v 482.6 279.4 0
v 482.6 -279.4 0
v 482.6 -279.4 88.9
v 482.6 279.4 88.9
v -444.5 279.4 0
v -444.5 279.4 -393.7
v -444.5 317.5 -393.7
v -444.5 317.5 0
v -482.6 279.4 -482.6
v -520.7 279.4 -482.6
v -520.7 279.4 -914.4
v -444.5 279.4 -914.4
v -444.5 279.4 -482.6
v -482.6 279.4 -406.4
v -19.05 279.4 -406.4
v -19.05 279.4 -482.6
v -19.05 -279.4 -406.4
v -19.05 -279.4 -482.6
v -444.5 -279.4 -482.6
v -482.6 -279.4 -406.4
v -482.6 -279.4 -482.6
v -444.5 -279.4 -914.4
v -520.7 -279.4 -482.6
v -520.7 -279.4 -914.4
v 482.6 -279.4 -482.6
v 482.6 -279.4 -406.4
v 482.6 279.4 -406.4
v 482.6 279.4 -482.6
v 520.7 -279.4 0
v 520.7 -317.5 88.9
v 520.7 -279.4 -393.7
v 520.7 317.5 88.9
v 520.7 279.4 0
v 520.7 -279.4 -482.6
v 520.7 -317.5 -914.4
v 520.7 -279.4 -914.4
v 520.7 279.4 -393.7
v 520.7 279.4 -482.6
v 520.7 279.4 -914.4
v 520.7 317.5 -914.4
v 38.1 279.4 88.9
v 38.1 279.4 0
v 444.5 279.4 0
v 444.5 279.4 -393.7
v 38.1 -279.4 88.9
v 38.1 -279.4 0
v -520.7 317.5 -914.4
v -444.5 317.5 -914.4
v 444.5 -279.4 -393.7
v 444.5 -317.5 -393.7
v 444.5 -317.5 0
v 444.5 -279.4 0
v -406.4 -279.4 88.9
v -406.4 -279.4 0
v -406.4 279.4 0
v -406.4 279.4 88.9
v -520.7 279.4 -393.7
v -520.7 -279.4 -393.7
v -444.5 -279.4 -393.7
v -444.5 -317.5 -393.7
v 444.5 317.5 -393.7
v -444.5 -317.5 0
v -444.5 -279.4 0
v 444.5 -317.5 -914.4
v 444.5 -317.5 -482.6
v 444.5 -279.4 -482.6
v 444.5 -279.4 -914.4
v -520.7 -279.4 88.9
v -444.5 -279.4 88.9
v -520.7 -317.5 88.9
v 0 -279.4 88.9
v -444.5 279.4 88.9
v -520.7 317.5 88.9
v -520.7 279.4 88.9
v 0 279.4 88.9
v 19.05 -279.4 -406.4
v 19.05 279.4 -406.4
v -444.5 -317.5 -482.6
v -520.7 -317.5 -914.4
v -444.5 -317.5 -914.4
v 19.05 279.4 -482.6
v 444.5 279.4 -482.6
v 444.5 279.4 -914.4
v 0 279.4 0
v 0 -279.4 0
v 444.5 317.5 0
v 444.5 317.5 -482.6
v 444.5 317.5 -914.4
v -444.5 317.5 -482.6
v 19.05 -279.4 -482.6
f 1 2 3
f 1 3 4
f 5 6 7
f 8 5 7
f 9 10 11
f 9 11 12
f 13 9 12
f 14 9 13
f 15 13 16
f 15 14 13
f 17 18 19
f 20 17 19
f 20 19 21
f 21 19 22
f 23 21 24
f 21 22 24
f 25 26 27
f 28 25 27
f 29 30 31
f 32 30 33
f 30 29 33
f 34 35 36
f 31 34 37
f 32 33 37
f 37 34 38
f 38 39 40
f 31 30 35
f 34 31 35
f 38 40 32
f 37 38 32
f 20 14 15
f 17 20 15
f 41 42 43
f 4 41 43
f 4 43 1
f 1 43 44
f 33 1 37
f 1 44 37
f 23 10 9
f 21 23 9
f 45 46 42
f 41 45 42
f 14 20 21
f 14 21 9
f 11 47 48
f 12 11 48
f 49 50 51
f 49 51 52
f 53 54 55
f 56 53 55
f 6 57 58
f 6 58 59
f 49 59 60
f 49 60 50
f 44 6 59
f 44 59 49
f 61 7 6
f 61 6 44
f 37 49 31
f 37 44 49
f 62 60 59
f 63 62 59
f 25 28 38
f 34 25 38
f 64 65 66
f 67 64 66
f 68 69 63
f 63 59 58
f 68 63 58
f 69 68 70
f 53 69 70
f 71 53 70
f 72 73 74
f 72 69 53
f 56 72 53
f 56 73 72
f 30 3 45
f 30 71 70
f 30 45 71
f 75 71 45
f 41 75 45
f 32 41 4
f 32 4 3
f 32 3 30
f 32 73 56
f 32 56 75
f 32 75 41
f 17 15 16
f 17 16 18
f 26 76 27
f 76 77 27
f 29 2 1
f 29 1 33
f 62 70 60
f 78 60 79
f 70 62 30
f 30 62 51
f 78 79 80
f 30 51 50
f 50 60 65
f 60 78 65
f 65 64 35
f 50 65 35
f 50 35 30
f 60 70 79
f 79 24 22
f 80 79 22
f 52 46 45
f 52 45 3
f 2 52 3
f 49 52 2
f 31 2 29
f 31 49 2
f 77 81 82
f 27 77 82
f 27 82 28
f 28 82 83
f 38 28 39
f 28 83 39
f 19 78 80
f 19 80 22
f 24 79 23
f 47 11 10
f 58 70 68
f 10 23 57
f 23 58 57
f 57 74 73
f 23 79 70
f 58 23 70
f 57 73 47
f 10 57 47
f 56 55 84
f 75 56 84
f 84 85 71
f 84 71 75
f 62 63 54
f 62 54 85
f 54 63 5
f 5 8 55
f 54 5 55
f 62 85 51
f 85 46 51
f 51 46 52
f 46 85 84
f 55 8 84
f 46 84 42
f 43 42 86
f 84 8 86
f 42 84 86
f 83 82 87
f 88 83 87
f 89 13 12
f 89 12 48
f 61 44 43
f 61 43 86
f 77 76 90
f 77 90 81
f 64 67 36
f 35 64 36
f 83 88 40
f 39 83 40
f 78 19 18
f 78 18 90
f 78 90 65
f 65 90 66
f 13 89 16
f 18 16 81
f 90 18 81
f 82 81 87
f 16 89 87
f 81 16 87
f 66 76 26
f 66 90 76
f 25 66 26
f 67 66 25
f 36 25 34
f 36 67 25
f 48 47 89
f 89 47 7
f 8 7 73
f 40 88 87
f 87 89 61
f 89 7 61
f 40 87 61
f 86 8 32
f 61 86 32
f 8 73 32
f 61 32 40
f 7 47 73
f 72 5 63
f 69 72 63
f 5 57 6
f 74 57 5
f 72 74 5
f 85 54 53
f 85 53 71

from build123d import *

# Parameters (mm, degrees)
SKETCH_W     = 406.4
SKETCH_H     = 558.8
SKETCH_W_2   = 444.5
PAD_DEPTH    = 88.9
SKETCH002_W  = 76.2
SKETCH002_H  = 38.1
PAD003_DEPTH = 914.4
SKETCH001_W  = 38.1
SKETCH001_H  = 558.8
PAD004_DEPTH = 76.2
SKETCH003_W  = 1041.4
SKETCH003_H  = 635
PAD005_DEPTH = 12.7


with BuildPart() as part:
    # Sketch → Pad (new body)
    with BuildSketch(Plane.XY):
        Polygon((-520.7, 317.5), (-520.7, 279.4), (-444.5, 279.4), (-444.5, -279.4), (-520.7, -279.4), (-520.7, -317.5), (520.7, -317.5), (520.7, 317.5), align=None)
        with Locations((-203.2, 0)):
            Rectangle(SKETCH_W, SKETCH_H, mode=Mode.SUBTRACT)
        with Locations((260.35, 0)):
            Rectangle(SKETCH_W_2, SKETCH_H, mode=Mode.SUBTRACT)
    extrude(amount=PAD_DEPTH)

    # Sketch002 → Pad003 (join)
    with BuildSketch(Plane.XY):
        with Locations((-482.6, 298.45)):
            Rectangle(SKETCH002_W, SKETCH002_H)
        with Locations((482.6, 298.45)):
            Rectangle(SKETCH002_W, SKETCH002_H)
        with Locations((482.6, -298.45)):
            Rectangle(SKETCH002_W, SKETCH002_H)
        with Locations((-482.6, -298.45)):
            Rectangle(SKETCH002_W, SKETCH002_H)
    extrude(amount=-PAD003_DEPTH)

    # Sketch001 → Pad004 (join)
    with BuildSketch(Plane.XY.offset(-406.4)):
        Polygon((-444.5, 279.4), (-19.05, 279.4), (-19.05, -279.4), (-444.5, -279.4), (-444.5, -317.5), (444.5, -317.5), (444.5, -279.4), (19.05, -279.4), (19.05, 279.4), (444.5, 279.4), (444.5, 317.5), (-444.5, 317.5), align=None)
        with Locations((-501.65, 0)):
            Rectangle(SKETCH001_W, SKETCH001_H)
        with Locations((501.65, 0)):
            Rectangle(SKETCH001_W, SKETCH001_H)
    extrude(amount=-PAD004_DEPTH)

    # Sketch003 → Pad005 (join)
    with BuildSketch(Plane.XY.offset(-406.4)):
        Rectangle(SKETCH003_W, SKETCH003_H)
    extrude(amount=PAD005_DEPTH)


solid = part.part
